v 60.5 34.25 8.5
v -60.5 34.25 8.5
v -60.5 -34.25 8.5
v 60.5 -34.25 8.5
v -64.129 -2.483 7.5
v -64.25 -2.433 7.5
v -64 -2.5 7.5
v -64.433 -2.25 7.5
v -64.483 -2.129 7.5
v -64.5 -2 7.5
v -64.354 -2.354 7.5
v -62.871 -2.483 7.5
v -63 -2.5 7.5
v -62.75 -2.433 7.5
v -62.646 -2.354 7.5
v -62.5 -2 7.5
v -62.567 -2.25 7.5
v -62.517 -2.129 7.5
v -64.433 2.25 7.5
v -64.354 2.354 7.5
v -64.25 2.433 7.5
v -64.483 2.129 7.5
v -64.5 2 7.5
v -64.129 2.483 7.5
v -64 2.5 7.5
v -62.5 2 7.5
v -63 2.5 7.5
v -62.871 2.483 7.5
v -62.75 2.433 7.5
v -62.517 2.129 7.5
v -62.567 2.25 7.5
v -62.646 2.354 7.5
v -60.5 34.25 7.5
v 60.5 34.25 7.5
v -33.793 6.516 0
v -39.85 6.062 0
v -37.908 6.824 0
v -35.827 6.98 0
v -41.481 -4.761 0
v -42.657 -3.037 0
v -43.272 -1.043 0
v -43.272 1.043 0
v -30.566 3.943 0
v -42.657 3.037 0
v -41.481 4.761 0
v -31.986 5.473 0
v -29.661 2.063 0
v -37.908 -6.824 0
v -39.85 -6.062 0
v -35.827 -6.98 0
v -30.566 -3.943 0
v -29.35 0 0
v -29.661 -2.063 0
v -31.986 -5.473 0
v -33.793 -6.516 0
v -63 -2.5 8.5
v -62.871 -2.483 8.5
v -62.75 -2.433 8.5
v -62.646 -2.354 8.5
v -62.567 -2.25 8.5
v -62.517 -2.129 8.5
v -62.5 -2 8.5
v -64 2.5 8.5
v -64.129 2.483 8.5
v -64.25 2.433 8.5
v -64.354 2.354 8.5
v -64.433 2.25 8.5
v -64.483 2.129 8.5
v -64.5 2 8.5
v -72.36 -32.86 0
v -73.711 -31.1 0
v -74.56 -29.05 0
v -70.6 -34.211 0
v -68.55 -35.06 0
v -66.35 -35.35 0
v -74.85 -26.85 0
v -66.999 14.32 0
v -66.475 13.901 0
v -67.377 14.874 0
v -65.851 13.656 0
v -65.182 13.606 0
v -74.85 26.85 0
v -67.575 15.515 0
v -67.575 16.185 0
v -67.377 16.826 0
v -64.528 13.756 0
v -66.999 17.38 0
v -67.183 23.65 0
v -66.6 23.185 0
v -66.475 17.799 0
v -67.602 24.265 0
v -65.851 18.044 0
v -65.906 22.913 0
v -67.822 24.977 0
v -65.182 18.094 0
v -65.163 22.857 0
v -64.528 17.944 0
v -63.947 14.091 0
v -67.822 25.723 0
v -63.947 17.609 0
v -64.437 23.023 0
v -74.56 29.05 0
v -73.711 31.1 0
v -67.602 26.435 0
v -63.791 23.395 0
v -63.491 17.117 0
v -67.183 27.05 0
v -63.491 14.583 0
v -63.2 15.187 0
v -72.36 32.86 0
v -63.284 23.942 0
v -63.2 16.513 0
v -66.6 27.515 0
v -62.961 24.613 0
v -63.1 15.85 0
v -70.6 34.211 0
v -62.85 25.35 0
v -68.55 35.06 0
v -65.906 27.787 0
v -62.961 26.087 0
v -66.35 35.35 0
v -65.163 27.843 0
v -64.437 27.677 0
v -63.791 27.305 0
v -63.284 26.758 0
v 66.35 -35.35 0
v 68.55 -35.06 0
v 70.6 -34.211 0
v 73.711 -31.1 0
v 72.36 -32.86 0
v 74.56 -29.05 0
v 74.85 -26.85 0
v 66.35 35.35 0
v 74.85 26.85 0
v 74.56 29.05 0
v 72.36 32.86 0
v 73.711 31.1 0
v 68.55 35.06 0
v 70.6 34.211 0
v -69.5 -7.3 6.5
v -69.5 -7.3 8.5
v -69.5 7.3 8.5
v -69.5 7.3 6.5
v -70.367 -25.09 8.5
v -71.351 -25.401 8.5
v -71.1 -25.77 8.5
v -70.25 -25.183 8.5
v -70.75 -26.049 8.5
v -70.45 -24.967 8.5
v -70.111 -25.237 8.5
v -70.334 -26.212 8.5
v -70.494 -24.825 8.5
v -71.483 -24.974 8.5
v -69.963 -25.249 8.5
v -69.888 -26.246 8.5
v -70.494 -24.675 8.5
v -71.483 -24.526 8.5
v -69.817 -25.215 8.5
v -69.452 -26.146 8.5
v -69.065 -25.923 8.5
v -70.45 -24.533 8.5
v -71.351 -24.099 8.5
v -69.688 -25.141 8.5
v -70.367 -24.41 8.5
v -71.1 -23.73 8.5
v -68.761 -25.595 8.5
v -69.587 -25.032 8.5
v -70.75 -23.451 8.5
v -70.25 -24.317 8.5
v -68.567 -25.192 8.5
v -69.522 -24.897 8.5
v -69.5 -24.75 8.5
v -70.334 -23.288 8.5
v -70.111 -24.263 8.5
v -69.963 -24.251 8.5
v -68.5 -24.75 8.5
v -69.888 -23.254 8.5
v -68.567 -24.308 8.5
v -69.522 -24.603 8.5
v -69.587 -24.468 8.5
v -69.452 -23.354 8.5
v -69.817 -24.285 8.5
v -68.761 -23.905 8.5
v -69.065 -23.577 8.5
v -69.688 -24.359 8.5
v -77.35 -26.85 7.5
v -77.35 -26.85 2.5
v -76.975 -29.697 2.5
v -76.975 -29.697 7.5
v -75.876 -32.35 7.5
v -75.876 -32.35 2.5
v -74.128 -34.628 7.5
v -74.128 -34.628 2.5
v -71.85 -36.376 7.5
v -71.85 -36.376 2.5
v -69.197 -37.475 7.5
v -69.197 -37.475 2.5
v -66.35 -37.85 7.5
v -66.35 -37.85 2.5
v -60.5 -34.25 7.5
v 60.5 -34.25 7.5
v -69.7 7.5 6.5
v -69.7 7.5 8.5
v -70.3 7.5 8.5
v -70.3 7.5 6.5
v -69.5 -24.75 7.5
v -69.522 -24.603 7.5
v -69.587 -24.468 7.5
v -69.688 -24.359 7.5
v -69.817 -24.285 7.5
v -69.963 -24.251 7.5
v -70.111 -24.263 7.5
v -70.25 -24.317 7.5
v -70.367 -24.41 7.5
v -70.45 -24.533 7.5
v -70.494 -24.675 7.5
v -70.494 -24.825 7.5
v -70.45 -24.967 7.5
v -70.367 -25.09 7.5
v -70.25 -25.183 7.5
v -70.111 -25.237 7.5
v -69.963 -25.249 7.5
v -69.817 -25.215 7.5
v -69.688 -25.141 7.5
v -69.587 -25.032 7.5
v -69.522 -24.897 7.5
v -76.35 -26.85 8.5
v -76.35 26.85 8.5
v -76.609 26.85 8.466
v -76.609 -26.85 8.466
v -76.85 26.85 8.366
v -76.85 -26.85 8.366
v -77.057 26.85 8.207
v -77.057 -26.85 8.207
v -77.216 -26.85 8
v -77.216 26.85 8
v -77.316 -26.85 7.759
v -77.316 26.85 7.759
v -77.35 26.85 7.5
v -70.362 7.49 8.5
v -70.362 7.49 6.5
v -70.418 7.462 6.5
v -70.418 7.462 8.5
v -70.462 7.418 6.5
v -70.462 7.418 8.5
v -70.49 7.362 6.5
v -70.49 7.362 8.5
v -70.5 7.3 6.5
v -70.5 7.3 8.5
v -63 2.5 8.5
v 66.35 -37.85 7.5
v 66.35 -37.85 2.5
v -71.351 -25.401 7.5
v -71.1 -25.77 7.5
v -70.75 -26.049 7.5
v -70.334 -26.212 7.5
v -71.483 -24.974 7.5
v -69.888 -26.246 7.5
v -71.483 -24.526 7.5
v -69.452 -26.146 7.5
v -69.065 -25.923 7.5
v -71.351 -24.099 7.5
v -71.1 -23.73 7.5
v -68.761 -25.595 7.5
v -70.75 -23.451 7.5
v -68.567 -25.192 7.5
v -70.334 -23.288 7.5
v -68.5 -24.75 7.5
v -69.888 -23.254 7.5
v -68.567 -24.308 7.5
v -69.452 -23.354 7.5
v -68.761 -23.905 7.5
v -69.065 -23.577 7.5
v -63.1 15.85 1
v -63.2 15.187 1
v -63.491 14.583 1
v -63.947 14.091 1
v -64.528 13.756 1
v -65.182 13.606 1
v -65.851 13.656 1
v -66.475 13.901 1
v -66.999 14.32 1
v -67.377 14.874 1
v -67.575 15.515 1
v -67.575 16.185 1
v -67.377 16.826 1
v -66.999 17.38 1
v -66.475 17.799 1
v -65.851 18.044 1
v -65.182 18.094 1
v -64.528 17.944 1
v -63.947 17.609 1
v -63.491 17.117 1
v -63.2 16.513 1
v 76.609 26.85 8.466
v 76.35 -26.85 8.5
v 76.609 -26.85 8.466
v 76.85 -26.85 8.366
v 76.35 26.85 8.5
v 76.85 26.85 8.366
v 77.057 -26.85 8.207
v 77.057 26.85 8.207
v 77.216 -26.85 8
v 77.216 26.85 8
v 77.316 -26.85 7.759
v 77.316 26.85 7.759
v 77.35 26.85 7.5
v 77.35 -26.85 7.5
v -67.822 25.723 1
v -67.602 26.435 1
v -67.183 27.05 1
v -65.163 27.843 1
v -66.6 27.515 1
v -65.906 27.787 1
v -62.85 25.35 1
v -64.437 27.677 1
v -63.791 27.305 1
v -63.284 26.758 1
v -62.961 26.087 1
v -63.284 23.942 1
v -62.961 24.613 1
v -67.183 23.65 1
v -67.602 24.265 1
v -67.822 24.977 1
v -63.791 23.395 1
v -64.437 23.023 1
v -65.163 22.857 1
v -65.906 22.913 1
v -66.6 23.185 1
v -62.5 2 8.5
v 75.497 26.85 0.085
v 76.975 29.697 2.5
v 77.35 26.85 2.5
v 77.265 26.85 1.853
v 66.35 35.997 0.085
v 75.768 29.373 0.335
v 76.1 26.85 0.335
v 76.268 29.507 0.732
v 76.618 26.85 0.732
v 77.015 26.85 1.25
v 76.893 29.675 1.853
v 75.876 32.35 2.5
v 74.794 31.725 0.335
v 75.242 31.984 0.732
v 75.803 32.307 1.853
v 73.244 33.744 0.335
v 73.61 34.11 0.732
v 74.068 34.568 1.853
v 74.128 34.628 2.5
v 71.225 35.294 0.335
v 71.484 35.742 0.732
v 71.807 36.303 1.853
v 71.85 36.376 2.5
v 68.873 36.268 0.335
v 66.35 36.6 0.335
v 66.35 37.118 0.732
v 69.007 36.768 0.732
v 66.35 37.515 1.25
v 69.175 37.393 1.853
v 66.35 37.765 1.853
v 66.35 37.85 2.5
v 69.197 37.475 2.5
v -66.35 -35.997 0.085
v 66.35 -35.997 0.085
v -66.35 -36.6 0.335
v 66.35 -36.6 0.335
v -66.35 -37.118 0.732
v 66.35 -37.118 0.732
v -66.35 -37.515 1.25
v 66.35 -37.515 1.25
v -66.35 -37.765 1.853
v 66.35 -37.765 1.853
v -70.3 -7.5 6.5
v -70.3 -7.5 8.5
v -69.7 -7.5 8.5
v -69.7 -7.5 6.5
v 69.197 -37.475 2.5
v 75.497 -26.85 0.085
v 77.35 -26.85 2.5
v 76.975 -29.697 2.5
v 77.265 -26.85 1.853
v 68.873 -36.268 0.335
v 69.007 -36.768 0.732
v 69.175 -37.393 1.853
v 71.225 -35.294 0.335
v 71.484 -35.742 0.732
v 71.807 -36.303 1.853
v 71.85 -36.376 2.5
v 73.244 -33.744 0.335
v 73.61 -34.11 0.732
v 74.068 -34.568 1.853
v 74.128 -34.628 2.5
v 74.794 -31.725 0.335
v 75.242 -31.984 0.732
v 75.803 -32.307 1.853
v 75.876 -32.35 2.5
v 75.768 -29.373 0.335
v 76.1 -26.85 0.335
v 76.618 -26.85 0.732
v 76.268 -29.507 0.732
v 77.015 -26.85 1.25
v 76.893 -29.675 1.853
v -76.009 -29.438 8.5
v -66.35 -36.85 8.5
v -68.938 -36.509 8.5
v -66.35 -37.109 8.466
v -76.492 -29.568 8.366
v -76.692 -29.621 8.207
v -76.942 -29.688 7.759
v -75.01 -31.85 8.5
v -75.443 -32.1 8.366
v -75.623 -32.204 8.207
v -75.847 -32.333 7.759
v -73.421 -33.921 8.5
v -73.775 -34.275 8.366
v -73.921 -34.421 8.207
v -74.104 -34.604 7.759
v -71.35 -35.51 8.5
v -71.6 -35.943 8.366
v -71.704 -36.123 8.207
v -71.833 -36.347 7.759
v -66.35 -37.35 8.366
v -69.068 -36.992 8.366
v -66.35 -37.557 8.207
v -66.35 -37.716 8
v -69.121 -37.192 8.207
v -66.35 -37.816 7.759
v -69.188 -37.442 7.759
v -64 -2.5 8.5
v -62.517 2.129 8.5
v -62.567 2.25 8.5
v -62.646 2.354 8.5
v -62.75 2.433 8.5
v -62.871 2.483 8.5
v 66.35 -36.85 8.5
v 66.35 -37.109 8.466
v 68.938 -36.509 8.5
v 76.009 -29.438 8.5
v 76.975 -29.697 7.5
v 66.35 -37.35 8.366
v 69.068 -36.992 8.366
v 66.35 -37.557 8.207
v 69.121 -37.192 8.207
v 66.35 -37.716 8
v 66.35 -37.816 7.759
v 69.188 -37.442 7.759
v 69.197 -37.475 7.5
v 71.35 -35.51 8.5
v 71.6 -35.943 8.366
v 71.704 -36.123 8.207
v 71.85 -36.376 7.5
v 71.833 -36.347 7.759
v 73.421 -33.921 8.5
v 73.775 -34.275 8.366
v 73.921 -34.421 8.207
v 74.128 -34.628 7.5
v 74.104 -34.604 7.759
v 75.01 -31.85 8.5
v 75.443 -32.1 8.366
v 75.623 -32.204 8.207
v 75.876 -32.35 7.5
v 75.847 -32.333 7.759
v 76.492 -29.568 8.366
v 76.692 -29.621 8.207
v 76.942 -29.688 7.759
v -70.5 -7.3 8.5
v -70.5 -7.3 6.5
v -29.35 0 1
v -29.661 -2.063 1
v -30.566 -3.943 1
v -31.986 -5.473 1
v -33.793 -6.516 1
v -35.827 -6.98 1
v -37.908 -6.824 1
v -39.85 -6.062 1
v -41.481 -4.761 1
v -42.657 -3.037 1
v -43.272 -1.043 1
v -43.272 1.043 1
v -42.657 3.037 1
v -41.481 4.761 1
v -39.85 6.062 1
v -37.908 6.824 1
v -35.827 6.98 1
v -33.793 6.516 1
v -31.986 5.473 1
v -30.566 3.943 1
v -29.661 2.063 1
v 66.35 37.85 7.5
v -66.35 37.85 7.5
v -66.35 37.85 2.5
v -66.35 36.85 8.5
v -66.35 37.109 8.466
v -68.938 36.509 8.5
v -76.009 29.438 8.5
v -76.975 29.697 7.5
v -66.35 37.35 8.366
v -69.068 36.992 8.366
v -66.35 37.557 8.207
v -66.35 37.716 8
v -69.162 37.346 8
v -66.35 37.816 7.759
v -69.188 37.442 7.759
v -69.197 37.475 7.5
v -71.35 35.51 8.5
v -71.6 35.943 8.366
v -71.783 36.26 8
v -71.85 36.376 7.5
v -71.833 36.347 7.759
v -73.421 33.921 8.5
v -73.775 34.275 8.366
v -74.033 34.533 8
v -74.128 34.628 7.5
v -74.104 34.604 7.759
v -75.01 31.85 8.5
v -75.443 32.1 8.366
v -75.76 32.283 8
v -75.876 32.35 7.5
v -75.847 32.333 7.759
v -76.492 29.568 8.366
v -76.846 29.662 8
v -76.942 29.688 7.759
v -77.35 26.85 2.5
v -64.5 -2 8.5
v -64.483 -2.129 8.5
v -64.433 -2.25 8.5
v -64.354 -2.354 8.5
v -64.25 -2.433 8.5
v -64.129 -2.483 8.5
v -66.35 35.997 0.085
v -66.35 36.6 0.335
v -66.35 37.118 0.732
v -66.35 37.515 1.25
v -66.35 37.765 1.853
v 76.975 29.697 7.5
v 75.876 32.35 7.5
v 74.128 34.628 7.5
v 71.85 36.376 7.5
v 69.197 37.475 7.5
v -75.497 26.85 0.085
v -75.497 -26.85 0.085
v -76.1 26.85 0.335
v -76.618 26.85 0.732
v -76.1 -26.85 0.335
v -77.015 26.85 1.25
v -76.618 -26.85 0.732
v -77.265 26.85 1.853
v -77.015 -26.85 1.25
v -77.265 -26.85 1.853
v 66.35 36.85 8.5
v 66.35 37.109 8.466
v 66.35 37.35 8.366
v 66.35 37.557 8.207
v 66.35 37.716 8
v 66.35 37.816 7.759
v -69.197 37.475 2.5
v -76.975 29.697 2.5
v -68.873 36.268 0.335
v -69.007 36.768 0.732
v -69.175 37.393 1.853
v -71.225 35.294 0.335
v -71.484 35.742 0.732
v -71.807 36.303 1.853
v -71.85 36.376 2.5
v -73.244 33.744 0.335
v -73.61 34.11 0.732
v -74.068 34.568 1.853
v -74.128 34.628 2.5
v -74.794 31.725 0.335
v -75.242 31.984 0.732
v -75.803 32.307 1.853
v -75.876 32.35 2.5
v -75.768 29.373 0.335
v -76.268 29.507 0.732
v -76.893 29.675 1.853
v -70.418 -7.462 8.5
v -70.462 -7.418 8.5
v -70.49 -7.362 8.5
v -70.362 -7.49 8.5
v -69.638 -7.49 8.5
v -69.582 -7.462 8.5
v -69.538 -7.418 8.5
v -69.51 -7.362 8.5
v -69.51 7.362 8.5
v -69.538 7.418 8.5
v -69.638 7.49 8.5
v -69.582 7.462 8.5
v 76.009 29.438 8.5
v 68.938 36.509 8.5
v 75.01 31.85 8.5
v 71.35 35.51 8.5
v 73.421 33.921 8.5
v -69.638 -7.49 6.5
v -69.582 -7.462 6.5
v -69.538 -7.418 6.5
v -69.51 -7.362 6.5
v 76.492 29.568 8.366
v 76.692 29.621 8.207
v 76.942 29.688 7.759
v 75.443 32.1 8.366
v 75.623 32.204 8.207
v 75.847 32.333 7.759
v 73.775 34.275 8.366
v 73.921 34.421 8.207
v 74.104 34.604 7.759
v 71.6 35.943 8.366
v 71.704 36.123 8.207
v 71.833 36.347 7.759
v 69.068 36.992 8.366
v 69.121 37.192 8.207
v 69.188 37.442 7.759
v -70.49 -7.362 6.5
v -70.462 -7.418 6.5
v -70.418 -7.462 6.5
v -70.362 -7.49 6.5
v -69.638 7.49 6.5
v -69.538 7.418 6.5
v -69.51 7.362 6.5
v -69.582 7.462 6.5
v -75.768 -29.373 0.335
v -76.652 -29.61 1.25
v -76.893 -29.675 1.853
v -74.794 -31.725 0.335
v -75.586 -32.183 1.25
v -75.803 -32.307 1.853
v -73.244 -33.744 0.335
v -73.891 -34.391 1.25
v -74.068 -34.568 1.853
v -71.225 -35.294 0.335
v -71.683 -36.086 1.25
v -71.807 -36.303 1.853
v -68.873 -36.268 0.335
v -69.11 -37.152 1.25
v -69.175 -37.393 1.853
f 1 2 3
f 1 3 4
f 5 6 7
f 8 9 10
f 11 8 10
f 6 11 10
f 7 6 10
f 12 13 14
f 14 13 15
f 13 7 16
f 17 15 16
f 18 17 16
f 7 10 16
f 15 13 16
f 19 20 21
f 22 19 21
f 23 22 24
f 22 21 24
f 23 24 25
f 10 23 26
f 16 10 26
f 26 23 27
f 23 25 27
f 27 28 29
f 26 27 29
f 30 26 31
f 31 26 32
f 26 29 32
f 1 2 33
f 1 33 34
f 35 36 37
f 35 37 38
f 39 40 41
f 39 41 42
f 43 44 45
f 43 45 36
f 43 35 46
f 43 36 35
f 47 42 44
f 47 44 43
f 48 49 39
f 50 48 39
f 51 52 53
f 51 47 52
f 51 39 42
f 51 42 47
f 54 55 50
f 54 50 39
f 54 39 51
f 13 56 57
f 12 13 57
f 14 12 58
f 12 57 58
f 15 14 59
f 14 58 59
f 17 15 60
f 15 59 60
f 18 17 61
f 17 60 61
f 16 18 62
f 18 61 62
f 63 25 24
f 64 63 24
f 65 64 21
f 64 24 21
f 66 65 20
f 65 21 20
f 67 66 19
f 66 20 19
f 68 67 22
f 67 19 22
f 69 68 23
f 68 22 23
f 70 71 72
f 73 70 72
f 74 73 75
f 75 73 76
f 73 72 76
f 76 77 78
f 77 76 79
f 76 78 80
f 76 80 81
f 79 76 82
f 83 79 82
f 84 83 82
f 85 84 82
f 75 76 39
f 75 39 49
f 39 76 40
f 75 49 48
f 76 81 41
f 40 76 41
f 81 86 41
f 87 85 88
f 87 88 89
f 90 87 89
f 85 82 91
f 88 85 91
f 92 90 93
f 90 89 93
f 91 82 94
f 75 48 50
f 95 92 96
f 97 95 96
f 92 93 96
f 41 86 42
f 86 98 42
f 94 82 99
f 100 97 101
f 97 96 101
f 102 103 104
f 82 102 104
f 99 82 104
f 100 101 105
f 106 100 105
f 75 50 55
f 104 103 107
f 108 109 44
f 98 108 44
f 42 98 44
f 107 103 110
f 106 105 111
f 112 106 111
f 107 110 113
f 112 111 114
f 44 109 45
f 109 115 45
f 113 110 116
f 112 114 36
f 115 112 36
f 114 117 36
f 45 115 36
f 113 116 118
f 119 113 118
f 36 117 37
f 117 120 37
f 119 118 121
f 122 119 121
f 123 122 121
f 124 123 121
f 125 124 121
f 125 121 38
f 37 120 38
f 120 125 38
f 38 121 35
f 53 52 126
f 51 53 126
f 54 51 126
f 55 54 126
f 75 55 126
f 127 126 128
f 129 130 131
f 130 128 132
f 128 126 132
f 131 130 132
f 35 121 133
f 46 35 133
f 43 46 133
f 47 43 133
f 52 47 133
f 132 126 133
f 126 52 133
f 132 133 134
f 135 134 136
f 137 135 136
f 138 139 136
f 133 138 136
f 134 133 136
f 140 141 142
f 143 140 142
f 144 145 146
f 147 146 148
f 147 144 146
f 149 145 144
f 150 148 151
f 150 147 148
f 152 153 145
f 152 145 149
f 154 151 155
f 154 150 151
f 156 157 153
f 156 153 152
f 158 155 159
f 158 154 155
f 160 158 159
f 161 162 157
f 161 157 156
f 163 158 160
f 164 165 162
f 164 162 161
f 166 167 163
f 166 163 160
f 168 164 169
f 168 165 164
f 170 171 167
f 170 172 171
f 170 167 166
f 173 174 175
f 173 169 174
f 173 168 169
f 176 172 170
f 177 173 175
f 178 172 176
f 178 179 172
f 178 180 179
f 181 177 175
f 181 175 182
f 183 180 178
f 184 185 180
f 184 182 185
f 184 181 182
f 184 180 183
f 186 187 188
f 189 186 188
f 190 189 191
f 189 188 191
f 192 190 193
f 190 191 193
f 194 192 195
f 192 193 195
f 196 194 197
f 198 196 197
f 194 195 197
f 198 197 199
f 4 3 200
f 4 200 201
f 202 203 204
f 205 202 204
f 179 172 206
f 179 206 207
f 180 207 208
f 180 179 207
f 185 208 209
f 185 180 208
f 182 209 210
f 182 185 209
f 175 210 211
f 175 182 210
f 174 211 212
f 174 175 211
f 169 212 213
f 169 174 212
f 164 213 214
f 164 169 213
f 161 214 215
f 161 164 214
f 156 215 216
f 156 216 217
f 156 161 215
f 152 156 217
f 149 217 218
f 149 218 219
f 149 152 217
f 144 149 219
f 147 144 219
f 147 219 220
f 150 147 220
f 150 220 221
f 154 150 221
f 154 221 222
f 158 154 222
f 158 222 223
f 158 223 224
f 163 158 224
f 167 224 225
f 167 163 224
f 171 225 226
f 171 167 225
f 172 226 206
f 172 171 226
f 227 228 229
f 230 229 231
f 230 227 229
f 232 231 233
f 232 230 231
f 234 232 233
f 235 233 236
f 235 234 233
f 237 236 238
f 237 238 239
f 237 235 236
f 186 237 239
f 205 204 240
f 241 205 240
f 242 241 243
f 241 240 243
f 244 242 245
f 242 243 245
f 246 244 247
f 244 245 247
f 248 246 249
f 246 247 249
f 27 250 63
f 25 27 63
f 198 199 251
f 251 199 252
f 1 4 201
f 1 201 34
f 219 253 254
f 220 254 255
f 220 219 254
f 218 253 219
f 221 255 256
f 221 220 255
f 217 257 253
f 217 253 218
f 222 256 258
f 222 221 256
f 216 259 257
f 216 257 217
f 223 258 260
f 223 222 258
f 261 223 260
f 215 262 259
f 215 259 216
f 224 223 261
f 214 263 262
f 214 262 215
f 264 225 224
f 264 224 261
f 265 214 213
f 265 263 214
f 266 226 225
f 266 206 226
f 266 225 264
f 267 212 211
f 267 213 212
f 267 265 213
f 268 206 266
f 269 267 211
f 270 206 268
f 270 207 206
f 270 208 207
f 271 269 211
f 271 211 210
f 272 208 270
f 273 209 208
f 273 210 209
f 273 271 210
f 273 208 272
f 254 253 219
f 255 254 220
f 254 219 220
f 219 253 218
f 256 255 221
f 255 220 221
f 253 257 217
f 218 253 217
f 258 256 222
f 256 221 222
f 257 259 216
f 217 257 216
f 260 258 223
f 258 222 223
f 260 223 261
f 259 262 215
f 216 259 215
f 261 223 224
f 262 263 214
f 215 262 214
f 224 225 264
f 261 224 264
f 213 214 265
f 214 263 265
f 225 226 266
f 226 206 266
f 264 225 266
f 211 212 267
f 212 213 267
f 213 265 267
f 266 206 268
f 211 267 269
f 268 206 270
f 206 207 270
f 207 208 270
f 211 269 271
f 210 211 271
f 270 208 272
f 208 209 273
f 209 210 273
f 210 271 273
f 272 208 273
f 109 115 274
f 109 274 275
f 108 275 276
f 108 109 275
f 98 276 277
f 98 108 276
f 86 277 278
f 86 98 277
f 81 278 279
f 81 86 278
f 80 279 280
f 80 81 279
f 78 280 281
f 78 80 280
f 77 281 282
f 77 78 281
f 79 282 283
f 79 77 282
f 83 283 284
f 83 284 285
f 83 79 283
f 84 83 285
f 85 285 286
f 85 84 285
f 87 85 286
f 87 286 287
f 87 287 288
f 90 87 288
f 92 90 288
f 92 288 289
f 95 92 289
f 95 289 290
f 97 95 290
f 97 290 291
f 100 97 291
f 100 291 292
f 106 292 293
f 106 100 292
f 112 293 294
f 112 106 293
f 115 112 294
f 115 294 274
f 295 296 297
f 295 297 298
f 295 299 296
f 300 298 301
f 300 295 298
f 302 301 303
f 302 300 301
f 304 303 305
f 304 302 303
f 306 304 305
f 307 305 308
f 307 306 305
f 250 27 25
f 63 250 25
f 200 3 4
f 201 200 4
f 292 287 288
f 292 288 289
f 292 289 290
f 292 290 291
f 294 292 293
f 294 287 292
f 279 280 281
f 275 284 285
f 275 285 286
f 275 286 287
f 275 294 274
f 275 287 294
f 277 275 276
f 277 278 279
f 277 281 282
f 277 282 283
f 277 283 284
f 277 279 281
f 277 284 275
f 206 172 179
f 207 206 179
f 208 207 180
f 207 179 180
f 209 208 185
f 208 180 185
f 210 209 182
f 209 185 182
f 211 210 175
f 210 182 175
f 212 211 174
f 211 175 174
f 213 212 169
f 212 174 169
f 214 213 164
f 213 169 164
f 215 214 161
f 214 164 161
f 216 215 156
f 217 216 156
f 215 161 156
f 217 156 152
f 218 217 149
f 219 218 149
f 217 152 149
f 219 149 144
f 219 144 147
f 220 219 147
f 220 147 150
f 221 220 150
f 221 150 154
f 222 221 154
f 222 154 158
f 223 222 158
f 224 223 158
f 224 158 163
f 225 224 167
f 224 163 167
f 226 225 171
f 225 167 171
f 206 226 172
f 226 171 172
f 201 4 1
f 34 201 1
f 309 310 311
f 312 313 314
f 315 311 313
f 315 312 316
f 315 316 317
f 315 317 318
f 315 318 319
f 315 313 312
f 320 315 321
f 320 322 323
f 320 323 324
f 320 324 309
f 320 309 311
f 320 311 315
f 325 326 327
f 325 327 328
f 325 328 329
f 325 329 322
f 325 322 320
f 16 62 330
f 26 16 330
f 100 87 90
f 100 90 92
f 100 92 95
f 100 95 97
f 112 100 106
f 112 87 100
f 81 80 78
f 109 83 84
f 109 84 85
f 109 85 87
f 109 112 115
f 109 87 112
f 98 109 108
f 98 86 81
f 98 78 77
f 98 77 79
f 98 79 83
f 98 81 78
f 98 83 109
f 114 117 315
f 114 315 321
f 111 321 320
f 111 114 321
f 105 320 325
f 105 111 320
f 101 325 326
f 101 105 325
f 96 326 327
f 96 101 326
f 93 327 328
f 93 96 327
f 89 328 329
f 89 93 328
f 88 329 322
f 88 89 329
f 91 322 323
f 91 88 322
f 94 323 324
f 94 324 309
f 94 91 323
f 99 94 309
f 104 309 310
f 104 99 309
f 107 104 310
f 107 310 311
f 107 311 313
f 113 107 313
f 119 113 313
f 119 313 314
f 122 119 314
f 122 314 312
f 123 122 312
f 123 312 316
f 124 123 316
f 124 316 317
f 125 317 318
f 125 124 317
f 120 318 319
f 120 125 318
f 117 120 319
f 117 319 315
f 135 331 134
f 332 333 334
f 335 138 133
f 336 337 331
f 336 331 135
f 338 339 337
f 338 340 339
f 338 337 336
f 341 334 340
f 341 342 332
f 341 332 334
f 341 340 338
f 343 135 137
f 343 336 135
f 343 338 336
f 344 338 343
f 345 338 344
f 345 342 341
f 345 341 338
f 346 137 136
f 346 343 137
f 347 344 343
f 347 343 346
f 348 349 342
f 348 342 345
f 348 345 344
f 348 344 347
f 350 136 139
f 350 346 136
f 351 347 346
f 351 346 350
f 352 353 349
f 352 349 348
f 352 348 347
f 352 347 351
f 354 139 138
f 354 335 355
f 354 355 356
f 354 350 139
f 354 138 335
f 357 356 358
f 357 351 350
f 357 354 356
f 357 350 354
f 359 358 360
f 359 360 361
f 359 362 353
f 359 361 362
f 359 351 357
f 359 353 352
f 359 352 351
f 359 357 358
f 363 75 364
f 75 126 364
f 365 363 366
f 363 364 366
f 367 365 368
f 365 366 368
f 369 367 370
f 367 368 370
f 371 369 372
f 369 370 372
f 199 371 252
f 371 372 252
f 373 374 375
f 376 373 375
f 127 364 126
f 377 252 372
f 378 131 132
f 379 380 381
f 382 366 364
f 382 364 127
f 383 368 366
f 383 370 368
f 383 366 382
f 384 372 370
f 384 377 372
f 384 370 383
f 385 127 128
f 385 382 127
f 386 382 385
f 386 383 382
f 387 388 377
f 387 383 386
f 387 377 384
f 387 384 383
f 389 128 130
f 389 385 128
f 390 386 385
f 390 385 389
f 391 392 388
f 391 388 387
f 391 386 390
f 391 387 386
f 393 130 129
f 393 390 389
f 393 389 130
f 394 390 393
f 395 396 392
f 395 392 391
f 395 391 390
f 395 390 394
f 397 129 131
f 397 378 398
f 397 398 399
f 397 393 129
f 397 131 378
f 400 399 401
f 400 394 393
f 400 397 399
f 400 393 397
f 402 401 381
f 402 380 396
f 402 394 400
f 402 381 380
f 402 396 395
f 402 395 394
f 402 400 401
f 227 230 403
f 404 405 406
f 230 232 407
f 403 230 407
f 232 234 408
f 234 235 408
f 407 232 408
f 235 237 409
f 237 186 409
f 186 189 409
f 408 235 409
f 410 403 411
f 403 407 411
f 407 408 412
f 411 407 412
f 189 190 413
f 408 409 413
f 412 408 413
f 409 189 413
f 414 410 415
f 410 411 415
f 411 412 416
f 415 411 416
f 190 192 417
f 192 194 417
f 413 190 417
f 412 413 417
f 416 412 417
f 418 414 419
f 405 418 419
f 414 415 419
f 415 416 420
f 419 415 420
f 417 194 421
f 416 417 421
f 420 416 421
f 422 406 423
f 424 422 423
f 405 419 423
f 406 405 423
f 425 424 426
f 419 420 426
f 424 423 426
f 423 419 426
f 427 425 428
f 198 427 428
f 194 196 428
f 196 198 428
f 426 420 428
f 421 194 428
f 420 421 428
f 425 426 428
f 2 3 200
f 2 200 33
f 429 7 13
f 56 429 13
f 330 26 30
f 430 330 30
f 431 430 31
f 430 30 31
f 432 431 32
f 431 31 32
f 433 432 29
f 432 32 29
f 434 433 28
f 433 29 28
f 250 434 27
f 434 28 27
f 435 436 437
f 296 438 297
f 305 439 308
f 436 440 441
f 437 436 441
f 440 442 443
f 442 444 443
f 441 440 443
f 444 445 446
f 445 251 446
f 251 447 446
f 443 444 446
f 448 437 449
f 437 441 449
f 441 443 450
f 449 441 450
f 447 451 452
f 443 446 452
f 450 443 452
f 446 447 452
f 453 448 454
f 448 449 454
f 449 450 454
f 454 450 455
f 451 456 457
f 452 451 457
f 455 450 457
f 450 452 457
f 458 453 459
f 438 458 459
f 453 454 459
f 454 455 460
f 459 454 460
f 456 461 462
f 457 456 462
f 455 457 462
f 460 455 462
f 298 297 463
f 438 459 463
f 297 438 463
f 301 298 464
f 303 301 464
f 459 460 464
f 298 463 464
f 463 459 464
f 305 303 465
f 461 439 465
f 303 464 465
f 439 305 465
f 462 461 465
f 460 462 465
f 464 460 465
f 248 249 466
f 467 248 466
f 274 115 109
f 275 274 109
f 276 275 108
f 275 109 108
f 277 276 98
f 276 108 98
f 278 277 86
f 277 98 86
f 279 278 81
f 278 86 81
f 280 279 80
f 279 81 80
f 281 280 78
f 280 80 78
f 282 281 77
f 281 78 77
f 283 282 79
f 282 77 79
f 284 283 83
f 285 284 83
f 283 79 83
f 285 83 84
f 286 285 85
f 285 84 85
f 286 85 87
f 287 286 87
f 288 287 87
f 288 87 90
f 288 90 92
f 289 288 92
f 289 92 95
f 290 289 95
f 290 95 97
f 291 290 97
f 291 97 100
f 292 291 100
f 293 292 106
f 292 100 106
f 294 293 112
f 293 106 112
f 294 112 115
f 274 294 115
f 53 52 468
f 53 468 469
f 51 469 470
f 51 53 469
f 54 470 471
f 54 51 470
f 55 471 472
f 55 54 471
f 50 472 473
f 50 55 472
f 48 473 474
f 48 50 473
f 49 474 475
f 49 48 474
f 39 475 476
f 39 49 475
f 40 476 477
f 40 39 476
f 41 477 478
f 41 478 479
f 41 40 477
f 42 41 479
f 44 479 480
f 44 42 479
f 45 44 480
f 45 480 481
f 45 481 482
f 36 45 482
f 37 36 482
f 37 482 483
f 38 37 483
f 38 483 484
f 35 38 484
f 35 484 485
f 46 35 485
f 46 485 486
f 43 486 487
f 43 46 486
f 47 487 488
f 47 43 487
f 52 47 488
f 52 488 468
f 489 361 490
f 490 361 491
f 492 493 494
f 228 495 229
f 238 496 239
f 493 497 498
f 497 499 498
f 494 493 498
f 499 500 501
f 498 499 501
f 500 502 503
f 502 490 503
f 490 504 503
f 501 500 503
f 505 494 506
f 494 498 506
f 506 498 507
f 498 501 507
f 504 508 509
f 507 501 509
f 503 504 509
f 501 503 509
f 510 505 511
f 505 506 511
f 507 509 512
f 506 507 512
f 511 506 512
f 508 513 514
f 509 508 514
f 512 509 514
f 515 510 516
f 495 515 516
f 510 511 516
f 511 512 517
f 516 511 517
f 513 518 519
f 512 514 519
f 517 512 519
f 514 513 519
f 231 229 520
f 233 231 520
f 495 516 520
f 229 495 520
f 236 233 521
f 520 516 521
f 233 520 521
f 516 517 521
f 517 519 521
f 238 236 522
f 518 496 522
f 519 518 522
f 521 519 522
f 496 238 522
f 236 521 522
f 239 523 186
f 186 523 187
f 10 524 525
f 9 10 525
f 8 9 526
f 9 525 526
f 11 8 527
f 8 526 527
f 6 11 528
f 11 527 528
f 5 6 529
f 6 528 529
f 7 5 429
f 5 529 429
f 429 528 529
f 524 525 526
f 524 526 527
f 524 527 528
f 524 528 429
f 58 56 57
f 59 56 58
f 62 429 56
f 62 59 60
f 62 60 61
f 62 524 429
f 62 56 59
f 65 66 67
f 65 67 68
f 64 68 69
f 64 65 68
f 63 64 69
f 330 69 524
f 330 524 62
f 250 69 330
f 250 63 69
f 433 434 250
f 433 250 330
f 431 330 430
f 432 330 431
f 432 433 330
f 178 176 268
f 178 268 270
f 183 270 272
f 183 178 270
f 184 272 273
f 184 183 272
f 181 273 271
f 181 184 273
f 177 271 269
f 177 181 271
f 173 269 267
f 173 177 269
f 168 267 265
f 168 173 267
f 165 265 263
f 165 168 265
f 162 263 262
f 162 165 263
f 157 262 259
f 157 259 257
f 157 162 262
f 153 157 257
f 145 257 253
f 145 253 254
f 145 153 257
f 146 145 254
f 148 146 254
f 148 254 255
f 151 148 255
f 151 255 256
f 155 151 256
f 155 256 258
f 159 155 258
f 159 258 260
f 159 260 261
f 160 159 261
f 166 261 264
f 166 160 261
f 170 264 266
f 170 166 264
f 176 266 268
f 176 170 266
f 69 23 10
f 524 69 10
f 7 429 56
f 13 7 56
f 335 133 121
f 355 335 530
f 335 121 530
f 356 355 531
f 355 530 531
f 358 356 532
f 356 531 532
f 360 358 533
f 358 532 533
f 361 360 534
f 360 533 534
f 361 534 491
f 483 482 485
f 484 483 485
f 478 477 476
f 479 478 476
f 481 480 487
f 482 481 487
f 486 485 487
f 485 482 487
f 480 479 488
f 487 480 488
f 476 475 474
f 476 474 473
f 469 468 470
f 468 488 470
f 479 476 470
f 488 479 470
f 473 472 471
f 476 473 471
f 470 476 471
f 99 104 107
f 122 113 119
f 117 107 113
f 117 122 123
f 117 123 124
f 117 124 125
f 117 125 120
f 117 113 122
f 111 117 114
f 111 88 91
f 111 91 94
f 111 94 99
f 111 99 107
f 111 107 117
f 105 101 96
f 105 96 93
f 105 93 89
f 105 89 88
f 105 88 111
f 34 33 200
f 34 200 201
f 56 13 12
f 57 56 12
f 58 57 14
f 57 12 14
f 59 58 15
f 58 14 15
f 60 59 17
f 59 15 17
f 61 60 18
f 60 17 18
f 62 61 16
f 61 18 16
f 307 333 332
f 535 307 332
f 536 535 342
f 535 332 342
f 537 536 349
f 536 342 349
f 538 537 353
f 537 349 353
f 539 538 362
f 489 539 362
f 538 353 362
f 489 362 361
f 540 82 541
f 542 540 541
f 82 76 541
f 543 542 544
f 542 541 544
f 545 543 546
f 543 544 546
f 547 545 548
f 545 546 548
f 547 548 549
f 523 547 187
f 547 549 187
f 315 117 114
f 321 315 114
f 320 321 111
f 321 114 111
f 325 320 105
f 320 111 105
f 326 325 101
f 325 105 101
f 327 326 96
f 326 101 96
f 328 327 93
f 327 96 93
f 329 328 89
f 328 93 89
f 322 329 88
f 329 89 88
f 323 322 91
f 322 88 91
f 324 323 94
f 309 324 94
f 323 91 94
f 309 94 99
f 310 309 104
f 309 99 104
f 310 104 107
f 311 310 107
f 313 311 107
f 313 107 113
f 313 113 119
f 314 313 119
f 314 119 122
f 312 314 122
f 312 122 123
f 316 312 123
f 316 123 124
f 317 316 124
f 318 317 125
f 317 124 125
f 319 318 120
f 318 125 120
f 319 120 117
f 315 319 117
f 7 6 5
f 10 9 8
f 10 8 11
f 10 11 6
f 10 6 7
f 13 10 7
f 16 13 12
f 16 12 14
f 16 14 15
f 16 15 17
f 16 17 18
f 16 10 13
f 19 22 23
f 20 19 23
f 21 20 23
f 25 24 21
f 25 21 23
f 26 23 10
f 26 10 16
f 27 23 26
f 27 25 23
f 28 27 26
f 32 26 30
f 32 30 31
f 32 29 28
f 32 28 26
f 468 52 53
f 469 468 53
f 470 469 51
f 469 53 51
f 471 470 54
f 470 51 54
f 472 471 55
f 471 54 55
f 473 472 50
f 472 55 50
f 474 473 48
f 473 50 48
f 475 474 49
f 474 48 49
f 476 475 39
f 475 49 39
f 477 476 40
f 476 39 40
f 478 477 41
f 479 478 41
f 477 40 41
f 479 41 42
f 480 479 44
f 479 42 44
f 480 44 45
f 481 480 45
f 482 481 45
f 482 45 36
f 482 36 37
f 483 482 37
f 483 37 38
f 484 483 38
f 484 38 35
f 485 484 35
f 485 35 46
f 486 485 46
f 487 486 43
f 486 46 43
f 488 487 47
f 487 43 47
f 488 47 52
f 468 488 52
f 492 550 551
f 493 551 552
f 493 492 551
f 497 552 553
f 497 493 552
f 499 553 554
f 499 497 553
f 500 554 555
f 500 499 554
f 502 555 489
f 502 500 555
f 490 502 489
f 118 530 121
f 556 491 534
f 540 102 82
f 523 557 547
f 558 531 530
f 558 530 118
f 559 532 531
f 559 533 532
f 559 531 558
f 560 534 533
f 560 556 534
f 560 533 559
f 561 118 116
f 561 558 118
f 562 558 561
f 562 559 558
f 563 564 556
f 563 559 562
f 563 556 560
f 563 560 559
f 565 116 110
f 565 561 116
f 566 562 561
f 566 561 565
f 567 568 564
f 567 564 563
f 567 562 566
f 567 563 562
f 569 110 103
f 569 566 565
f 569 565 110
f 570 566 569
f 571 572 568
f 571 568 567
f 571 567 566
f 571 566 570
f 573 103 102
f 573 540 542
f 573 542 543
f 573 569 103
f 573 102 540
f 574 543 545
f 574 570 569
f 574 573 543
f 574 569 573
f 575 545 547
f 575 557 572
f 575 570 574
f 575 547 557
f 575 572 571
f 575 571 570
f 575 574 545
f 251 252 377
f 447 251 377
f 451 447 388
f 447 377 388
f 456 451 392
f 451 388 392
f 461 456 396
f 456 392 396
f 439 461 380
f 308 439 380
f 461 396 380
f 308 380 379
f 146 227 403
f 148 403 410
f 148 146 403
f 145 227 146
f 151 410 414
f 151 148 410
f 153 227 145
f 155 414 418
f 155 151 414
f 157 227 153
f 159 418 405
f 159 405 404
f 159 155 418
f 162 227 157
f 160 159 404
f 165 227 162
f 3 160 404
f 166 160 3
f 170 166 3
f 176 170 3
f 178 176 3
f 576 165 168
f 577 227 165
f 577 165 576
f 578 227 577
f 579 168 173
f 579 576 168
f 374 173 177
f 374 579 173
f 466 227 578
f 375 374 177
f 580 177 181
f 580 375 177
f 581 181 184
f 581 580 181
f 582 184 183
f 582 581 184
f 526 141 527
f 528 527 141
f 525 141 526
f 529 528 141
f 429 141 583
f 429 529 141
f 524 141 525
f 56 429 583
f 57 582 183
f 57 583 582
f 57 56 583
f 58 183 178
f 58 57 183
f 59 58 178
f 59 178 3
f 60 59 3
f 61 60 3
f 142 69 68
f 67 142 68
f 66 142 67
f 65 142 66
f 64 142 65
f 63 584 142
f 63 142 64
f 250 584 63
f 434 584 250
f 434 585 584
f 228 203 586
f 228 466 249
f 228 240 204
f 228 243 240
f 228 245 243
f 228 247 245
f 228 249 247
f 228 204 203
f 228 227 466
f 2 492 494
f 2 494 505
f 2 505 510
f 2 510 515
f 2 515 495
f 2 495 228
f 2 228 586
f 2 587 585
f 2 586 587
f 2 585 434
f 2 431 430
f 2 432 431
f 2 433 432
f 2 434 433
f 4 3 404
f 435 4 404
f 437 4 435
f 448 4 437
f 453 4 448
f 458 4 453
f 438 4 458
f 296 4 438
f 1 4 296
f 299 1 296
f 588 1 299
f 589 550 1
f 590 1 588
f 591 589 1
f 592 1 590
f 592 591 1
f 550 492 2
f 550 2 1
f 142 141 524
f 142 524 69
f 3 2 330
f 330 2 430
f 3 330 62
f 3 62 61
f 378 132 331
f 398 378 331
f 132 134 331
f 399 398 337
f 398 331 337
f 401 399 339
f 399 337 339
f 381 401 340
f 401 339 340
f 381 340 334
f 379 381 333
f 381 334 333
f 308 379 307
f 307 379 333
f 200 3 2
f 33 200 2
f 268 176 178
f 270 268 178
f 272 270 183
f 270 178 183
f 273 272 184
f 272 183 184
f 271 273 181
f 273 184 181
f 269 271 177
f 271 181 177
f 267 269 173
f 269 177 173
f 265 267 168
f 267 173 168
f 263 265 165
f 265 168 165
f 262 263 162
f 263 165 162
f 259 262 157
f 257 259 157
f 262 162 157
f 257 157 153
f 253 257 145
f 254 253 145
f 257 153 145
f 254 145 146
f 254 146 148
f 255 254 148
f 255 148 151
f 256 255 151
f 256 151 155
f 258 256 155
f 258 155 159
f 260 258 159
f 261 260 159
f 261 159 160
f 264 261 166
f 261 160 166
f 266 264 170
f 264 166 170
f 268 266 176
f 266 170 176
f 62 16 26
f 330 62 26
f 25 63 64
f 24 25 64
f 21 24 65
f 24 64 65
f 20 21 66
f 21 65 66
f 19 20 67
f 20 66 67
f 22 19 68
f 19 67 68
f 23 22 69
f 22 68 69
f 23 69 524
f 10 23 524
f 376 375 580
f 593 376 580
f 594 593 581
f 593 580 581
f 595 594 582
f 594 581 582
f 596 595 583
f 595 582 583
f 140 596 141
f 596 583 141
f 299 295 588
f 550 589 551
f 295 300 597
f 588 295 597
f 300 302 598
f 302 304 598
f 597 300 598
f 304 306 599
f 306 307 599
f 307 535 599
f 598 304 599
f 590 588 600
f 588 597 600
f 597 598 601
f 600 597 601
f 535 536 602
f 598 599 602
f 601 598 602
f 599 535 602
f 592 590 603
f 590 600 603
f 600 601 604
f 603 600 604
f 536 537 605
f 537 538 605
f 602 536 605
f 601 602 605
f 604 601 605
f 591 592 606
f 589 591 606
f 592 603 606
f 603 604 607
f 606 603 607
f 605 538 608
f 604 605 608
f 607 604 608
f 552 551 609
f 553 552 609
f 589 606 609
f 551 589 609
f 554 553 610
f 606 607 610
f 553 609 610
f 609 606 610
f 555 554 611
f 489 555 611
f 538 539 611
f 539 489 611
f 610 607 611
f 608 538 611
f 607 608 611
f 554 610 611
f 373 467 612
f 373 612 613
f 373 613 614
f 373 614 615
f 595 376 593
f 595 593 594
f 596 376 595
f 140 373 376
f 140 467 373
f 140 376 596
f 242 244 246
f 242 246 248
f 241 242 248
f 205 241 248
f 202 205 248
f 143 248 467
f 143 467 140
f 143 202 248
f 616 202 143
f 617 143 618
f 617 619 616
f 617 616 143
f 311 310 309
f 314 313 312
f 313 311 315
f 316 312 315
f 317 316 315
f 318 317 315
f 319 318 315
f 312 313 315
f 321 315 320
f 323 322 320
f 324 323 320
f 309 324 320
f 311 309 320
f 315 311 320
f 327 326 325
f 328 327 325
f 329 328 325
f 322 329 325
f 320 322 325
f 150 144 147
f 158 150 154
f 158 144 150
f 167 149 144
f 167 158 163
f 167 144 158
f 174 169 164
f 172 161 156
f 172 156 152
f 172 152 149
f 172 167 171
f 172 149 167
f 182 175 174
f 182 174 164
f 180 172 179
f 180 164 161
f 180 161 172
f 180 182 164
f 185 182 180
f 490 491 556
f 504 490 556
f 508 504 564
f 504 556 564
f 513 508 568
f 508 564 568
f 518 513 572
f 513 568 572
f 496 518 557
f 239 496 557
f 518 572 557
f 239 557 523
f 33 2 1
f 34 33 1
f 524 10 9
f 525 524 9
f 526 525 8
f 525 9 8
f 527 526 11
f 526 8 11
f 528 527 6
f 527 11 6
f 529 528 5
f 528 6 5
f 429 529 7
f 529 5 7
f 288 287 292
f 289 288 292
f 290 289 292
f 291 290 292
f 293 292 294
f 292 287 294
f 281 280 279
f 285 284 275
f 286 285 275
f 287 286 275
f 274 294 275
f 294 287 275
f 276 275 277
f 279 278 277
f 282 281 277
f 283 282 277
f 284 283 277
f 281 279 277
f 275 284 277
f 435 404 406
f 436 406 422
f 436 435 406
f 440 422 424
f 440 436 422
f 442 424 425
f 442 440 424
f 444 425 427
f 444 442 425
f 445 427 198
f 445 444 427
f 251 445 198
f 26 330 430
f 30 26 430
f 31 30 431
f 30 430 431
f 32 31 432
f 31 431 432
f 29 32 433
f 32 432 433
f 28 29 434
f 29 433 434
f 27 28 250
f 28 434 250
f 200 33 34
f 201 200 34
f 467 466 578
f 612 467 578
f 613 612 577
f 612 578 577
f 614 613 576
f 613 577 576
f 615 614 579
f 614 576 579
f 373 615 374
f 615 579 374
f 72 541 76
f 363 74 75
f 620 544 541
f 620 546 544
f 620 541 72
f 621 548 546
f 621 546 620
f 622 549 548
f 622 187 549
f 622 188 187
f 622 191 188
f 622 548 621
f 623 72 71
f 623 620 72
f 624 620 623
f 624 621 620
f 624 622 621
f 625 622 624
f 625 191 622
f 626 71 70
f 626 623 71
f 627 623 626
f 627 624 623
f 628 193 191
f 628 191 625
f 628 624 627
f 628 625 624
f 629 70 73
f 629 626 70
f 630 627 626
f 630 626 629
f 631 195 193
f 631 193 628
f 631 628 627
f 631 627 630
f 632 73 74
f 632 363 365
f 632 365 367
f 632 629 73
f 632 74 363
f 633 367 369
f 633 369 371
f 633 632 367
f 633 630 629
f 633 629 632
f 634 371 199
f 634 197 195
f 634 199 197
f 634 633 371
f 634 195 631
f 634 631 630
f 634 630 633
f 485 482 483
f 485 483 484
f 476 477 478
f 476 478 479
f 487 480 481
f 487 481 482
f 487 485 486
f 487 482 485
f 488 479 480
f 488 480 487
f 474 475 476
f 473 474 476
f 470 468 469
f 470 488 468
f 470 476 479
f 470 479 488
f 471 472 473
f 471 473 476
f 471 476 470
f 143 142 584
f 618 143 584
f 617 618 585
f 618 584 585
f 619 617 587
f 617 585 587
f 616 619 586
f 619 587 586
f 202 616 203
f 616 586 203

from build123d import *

# Parameters (mm, degrees)
F1_DEPTH  = 8.5
F2_W      = 121
F2_H      = 68.5
F3_DEPTH  = 1
F4_DEPTH  = 1
F2_R      = 1.5
F2_R_2    = 0.5
F5_DEPTH  = 1
F6_DEPTH  = 1
F7_R      = 7
F8_DEPTH  = 1
F9_DEPTH  = 1
F10_R     = 1
F11_R     = 2.5
F12_DEPTH = 2
F13_DEPTH = 1
F14_DEPTH = 1
F7_R_2    = 2.5
F15_DEPTH = 1
F16_DEPTH = 1
F7_R_3    = 2.25
F17_DEPTH = 1
F18_DEPTH = 1


with BuildPart() as f1:
    # F0 (on Top) → F1 (new body)
    with BuildSketch(Plane.XY):
        with BuildLine():
            ThreePointArc((77.35, 26.85), (74.128175, 34.628175), (66.35, 37.85))
            Line((66.35, 37.85), (-66.35, 37.85))
            ThreePointArc((-66.35, 37.85), (-74.128175, 34.628175), (-77.35, 26.85))
            Line((-77.35, 26.85), (-77.35, -26.85))
            ThreePointArc((-77.35, -26.85), (-74.128175, -34.628175), (-66.35, -37.85))
            Line((-66.35, -37.85), (66.35, -37.85))
            ThreePointArc((66.35, -37.85), (74.128175, -34.628175), (77.35, -26.85))
            Line((77.35, -26.85), (77.35, 26.85))
        make_face()
    extrude(amount=F1_DEPTH)

    # F2 (on face) → F3 (cut)
    with BuildSketch(Plane.XY.offset(8.5)):
        Rectangle(F2_W, F2_H)
    extrude(amount=-F3_DEPTH, mode=Mode.SUBTRACT)

    # F2 (on face) → F5 (cut)
    with BuildSketch(Plane.XY.offset(8.5)):
        with Locations((-70, -24.75)):
            Circle(F2_R)
        with Locations((-70, -24.75)):
            Circle(F2_R_2, mode=Mode.SUBTRACT)
    extrude(amount=-F5_DEPTH, mode=Mode.SUBTRACT)

    # F7 (on face) → F8 (cut)
    with BuildSketch(Plane(origin=(0, 0, 0), x_dir=(1, 0, 0), z_dir=(0, 0, -1))):
        with Locations((-36.35, 0)):
            Circle(F7_R)
    extrude(amount=-F8_DEPTH, mode=Mode.SUBTRACT)

    # F10
    f10_edges = [f1.edges().sort_by_distance(p)[0] for p in [
        (-77.35, 0, 8.5),
    ]]
    fillet(f10_edges, radius=F10_R)

    # F11
    f11_edges = [f1.edges().sort_by_distance(p)[0] for p in [
        (0, -37.85, 0),
    ]]
    fillet(f11_edges, radius=F11_R)

    # F2 (on face) → F12 (cut)
    with BuildSketch(Plane.XY.offset(8.5)):
        with BuildLine():
            ThreePointArc((-69.5, 7.3), (-69.558579, 7.441421), (-69.7, 7.5))
            Line((-69.7, 7.5), (-70.3, 7.5))
            ThreePointArc((-70.3, 7.5), (-70.441421, 7.441421), (-70.5, 7.3))
            Line((-70.5, 7.3), (-70.5, -7.3))
            ThreePointArc((-70.5, -7.3), (-70.441421, -7.441421), (-70.3, -7.5))
            Line((-70.3, -7.5), (-69.7, -7.5))
            ThreePointArc((-69.7, -7.5), (-69.558579, -7.441421), (-69.5, -7.3))
            Line((-69.5, -7.3), (-69.5, 7.3))
        make_face()
    extrude(amount=-F12_DEPTH, mode=Mode.SUBTRACT)

    # F2 (on face) → F13 (cut)
    with BuildSketch(Plane.XY.offset(8.5)):
        with BuildLine():
            Line((-64, -2.5), (-63, -2.5))
            ThreePointArc((-63, -2.5), (-62.646447, -2.353553), (-62.5, -2))
            Line((-62.5, -2), (-62.5, 2))
            ThreePointArc((-62.5, 2), (-62.646447, 2.353553), (-63, 2.5))
            Line((-63, 2.5), (-64, 2.5))
            ThreePointArc((-64, 2.5), (-64.353553, 2.353553), (-64.5, 2))
            Line((-64.5, 2), (-64.5, -2))
            ThreePointArc((-64.5, -2), (-64.353553, -2.353553), (-64, -2.5))
        make_face()
    extrude(amount=-F13_DEPTH, mode=Mode.SUBTRACT)

    # F7 (on face) → F15 (cut)
    with BuildSketch(Plane(origin=(0, 0, 0), x_dir=(1, 0, 0), z_dir=(0, 0, -1))):
        with Locations((-65.35, -25.35)):
            Circle(F7_R_2)
    extrude(amount=-F15_DEPTH, mode=Mode.SUBTRACT)

    # F7 (on face) → F17 (cut)
    with BuildSketch(Plane(origin=(0, 0, 0), x_dir=(1, 0, 0), z_dir=(0, 0, -1))):
        with Locations((-65.35, -15.85)):
            Circle(F7_R_3)
    extrude(amount=-F17_DEPTH, mode=Mode.SUBTRACT)


with BuildPart() as f4:
    # F2 (on face) → F4 (new body)
    with BuildSketch(Plane.XY.offset(8.5)):
        Rectangle(F2_W, F2_H)
    extrude(amount=-F4_DEPTH)


with BuildPart() as f6:
    # F2 (on face) → F6 (new body)
    with BuildSketch(Plane.XY.offset(8.5)):
        with Locations((-70, -24.75)):
            Circle(F2_R)
        with Locations((-70, -24.75)):
            Circle(F2_R_2, mode=Mode.SUBTRACT)
    extrude(amount=-F6_DEPTH)


with BuildPart() as f9:
    # F7 (on face) → F9 (new body)
    with BuildSketch(Plane(origin=(0, 0, 0), x_dir=(1, 0, 0), z_dir=(0, 0, -1))):
        with Locations((-36.35, 0)):
            Circle(F7_R)
    extrude(amount=-F9_DEPTH)


with BuildPart() as f14:
    # F13_face (on face) → F14 (new body)
    with BuildSketch(Plane(origin=(-63.5, 0, 7.5), x_dir=(1, 0, 0), z_dir=(0, 0, 1))):
        with BuildLine():
            Line((-0.5, -2.5), (0.5, -2.5))
            ThreePointArc((0.5, -2.5), (0.853553, -2.353553), (1, -2))
            Line((1, -2), (1, 2))
            ThreePointArc((1, 2), (0.853553, 2.353553), (0.5, 2.5))
            Line((0.5, 2.5), (-0.5, 2.5))
            ThreePointArc((-0.5, 2.5), (-0.853553, 2.353553), (-1, 2))
            Line((-1, 2), (-1, -2))
            ThreePointArc((-1, -2), (-0.853553, -2.353553), (-0.5, -2.5))
        make_face()
    extrude(amount=F14_DEPTH)


with BuildPart() as f16:
    # F7 (on face) → F16 (new body)
    with BuildSketch(Plane(origin=(0, 0, 0), x_dir=(1, 0, 0), z_dir=(0, 0, -1))):
        with Locations((-65.35, -25.35)):
            Circle(F7_R_2)
    extrude(amount=-F16_DEPTH)


with BuildPart() as f18:
    # F7 (on face) → F18 (new body)
    with BuildSketch(Plane(origin=(0, 0, 0), x_dir=(1, 0, 0), z_dir=(0, 0, -1))):
        with Locations((-65.35, -15.85)):
            Circle(F7_R_3)
    extrude(amount=-F18_DEPTH)


solid = Compound([f1.part, f4.part, f6.part, f9.part, f14.part, f16.part, f18.part])
